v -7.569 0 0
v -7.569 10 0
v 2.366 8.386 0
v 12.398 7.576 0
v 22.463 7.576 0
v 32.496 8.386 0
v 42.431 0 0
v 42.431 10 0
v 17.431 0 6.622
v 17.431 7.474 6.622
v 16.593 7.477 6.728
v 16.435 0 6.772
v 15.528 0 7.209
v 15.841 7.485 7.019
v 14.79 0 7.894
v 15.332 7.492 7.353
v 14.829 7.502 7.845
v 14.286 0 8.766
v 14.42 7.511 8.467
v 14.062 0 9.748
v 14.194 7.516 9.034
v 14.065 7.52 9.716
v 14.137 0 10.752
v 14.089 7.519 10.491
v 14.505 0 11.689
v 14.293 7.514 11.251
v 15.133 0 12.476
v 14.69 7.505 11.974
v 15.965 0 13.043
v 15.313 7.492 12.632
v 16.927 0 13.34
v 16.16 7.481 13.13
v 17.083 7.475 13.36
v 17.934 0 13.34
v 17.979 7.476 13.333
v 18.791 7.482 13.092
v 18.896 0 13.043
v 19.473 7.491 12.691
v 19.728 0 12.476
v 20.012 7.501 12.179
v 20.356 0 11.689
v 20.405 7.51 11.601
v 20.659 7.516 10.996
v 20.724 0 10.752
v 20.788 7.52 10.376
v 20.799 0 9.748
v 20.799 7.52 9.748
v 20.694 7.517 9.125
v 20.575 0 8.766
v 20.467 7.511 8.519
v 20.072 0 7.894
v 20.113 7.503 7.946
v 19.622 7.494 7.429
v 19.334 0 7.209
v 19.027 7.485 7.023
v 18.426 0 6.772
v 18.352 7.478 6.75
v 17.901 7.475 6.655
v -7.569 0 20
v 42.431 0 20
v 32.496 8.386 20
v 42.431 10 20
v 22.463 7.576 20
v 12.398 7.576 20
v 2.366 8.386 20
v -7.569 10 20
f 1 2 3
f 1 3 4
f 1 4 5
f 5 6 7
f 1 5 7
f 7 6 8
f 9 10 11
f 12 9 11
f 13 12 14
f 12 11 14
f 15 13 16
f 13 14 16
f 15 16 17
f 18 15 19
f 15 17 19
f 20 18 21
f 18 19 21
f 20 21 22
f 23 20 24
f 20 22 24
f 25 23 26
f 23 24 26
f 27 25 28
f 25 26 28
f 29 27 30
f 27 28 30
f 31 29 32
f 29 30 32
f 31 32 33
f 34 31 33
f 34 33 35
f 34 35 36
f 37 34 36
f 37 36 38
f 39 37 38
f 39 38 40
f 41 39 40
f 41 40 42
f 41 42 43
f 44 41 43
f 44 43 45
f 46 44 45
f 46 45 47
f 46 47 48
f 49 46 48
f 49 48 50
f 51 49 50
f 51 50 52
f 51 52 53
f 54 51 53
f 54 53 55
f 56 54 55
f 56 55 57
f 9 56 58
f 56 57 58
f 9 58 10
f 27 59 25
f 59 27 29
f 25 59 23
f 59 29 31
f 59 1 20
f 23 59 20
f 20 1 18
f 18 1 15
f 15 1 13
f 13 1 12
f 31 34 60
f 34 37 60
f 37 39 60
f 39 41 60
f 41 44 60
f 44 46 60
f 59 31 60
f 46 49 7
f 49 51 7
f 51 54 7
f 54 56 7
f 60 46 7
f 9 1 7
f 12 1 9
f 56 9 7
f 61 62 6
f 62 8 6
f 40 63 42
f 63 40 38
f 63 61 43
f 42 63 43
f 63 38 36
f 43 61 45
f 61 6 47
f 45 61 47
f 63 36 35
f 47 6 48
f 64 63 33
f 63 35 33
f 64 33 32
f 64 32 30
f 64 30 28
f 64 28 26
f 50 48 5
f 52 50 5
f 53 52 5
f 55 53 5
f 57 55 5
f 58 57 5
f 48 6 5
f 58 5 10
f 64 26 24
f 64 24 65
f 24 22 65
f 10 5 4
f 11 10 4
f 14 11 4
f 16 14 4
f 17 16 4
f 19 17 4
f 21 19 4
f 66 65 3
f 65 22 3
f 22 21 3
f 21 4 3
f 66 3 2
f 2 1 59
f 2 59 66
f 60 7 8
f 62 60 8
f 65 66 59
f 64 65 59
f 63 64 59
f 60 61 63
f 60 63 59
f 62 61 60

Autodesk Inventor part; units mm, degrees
ref_plane "YZ Plane" through (0, 0, 0) normal (1, 0, 0) x (0, 1, 0)
ref_plane "XZ Plane" through (0, 0, 0) normal (0, 1, 0) x (-1, 0, 0)
ref_plane "XY Plane" through (0, 0, 0) normal (0, 0, 1) x (1, 0, 0)
sketch "Sketch1" plane through (0, 0, 0) normal (0, 0, 1) x (1, 0, 0)
  line L0 (-7.5692, 0) -> (42.4308, 0)
  line L1 (42.4308, 0) -> (42.4308, 10)
  line L2 (-7.5692, 0) -> (-7.5692, 10)
  arc A0 (-7.5692, 10) -> (42.4308, 10) centre (17.4308, 132.4745) ccw
  point P0 (0, 0)
  dimension "d1" = 50
  dimension "d2" = 10
  dimension "d3" = 10
  dimension "d4" = 250
extrude "Extrusion1" add sketch "Sketch1" along normal blind 20
sketch "Sketch2" plane through (-7.5692, 0, 0) normal (0, -1, 0) x (1, 0, 0)
  line L0 (0, 0) -> (50, 0) projected
  point P0 (7.5692, 0)
  point P1 (25, 10)
  dimension "d7" = 10
hole "Hole1" at (17.4308, 0, 10) direction (0, 1, 0) diameter 6.756 end through all clearance for "Flat Head Machine Screw (82)" size "1/4" standard "Ansi Unified Screw Threads"
properties part number "podkladka" material "ABS Plastic"
